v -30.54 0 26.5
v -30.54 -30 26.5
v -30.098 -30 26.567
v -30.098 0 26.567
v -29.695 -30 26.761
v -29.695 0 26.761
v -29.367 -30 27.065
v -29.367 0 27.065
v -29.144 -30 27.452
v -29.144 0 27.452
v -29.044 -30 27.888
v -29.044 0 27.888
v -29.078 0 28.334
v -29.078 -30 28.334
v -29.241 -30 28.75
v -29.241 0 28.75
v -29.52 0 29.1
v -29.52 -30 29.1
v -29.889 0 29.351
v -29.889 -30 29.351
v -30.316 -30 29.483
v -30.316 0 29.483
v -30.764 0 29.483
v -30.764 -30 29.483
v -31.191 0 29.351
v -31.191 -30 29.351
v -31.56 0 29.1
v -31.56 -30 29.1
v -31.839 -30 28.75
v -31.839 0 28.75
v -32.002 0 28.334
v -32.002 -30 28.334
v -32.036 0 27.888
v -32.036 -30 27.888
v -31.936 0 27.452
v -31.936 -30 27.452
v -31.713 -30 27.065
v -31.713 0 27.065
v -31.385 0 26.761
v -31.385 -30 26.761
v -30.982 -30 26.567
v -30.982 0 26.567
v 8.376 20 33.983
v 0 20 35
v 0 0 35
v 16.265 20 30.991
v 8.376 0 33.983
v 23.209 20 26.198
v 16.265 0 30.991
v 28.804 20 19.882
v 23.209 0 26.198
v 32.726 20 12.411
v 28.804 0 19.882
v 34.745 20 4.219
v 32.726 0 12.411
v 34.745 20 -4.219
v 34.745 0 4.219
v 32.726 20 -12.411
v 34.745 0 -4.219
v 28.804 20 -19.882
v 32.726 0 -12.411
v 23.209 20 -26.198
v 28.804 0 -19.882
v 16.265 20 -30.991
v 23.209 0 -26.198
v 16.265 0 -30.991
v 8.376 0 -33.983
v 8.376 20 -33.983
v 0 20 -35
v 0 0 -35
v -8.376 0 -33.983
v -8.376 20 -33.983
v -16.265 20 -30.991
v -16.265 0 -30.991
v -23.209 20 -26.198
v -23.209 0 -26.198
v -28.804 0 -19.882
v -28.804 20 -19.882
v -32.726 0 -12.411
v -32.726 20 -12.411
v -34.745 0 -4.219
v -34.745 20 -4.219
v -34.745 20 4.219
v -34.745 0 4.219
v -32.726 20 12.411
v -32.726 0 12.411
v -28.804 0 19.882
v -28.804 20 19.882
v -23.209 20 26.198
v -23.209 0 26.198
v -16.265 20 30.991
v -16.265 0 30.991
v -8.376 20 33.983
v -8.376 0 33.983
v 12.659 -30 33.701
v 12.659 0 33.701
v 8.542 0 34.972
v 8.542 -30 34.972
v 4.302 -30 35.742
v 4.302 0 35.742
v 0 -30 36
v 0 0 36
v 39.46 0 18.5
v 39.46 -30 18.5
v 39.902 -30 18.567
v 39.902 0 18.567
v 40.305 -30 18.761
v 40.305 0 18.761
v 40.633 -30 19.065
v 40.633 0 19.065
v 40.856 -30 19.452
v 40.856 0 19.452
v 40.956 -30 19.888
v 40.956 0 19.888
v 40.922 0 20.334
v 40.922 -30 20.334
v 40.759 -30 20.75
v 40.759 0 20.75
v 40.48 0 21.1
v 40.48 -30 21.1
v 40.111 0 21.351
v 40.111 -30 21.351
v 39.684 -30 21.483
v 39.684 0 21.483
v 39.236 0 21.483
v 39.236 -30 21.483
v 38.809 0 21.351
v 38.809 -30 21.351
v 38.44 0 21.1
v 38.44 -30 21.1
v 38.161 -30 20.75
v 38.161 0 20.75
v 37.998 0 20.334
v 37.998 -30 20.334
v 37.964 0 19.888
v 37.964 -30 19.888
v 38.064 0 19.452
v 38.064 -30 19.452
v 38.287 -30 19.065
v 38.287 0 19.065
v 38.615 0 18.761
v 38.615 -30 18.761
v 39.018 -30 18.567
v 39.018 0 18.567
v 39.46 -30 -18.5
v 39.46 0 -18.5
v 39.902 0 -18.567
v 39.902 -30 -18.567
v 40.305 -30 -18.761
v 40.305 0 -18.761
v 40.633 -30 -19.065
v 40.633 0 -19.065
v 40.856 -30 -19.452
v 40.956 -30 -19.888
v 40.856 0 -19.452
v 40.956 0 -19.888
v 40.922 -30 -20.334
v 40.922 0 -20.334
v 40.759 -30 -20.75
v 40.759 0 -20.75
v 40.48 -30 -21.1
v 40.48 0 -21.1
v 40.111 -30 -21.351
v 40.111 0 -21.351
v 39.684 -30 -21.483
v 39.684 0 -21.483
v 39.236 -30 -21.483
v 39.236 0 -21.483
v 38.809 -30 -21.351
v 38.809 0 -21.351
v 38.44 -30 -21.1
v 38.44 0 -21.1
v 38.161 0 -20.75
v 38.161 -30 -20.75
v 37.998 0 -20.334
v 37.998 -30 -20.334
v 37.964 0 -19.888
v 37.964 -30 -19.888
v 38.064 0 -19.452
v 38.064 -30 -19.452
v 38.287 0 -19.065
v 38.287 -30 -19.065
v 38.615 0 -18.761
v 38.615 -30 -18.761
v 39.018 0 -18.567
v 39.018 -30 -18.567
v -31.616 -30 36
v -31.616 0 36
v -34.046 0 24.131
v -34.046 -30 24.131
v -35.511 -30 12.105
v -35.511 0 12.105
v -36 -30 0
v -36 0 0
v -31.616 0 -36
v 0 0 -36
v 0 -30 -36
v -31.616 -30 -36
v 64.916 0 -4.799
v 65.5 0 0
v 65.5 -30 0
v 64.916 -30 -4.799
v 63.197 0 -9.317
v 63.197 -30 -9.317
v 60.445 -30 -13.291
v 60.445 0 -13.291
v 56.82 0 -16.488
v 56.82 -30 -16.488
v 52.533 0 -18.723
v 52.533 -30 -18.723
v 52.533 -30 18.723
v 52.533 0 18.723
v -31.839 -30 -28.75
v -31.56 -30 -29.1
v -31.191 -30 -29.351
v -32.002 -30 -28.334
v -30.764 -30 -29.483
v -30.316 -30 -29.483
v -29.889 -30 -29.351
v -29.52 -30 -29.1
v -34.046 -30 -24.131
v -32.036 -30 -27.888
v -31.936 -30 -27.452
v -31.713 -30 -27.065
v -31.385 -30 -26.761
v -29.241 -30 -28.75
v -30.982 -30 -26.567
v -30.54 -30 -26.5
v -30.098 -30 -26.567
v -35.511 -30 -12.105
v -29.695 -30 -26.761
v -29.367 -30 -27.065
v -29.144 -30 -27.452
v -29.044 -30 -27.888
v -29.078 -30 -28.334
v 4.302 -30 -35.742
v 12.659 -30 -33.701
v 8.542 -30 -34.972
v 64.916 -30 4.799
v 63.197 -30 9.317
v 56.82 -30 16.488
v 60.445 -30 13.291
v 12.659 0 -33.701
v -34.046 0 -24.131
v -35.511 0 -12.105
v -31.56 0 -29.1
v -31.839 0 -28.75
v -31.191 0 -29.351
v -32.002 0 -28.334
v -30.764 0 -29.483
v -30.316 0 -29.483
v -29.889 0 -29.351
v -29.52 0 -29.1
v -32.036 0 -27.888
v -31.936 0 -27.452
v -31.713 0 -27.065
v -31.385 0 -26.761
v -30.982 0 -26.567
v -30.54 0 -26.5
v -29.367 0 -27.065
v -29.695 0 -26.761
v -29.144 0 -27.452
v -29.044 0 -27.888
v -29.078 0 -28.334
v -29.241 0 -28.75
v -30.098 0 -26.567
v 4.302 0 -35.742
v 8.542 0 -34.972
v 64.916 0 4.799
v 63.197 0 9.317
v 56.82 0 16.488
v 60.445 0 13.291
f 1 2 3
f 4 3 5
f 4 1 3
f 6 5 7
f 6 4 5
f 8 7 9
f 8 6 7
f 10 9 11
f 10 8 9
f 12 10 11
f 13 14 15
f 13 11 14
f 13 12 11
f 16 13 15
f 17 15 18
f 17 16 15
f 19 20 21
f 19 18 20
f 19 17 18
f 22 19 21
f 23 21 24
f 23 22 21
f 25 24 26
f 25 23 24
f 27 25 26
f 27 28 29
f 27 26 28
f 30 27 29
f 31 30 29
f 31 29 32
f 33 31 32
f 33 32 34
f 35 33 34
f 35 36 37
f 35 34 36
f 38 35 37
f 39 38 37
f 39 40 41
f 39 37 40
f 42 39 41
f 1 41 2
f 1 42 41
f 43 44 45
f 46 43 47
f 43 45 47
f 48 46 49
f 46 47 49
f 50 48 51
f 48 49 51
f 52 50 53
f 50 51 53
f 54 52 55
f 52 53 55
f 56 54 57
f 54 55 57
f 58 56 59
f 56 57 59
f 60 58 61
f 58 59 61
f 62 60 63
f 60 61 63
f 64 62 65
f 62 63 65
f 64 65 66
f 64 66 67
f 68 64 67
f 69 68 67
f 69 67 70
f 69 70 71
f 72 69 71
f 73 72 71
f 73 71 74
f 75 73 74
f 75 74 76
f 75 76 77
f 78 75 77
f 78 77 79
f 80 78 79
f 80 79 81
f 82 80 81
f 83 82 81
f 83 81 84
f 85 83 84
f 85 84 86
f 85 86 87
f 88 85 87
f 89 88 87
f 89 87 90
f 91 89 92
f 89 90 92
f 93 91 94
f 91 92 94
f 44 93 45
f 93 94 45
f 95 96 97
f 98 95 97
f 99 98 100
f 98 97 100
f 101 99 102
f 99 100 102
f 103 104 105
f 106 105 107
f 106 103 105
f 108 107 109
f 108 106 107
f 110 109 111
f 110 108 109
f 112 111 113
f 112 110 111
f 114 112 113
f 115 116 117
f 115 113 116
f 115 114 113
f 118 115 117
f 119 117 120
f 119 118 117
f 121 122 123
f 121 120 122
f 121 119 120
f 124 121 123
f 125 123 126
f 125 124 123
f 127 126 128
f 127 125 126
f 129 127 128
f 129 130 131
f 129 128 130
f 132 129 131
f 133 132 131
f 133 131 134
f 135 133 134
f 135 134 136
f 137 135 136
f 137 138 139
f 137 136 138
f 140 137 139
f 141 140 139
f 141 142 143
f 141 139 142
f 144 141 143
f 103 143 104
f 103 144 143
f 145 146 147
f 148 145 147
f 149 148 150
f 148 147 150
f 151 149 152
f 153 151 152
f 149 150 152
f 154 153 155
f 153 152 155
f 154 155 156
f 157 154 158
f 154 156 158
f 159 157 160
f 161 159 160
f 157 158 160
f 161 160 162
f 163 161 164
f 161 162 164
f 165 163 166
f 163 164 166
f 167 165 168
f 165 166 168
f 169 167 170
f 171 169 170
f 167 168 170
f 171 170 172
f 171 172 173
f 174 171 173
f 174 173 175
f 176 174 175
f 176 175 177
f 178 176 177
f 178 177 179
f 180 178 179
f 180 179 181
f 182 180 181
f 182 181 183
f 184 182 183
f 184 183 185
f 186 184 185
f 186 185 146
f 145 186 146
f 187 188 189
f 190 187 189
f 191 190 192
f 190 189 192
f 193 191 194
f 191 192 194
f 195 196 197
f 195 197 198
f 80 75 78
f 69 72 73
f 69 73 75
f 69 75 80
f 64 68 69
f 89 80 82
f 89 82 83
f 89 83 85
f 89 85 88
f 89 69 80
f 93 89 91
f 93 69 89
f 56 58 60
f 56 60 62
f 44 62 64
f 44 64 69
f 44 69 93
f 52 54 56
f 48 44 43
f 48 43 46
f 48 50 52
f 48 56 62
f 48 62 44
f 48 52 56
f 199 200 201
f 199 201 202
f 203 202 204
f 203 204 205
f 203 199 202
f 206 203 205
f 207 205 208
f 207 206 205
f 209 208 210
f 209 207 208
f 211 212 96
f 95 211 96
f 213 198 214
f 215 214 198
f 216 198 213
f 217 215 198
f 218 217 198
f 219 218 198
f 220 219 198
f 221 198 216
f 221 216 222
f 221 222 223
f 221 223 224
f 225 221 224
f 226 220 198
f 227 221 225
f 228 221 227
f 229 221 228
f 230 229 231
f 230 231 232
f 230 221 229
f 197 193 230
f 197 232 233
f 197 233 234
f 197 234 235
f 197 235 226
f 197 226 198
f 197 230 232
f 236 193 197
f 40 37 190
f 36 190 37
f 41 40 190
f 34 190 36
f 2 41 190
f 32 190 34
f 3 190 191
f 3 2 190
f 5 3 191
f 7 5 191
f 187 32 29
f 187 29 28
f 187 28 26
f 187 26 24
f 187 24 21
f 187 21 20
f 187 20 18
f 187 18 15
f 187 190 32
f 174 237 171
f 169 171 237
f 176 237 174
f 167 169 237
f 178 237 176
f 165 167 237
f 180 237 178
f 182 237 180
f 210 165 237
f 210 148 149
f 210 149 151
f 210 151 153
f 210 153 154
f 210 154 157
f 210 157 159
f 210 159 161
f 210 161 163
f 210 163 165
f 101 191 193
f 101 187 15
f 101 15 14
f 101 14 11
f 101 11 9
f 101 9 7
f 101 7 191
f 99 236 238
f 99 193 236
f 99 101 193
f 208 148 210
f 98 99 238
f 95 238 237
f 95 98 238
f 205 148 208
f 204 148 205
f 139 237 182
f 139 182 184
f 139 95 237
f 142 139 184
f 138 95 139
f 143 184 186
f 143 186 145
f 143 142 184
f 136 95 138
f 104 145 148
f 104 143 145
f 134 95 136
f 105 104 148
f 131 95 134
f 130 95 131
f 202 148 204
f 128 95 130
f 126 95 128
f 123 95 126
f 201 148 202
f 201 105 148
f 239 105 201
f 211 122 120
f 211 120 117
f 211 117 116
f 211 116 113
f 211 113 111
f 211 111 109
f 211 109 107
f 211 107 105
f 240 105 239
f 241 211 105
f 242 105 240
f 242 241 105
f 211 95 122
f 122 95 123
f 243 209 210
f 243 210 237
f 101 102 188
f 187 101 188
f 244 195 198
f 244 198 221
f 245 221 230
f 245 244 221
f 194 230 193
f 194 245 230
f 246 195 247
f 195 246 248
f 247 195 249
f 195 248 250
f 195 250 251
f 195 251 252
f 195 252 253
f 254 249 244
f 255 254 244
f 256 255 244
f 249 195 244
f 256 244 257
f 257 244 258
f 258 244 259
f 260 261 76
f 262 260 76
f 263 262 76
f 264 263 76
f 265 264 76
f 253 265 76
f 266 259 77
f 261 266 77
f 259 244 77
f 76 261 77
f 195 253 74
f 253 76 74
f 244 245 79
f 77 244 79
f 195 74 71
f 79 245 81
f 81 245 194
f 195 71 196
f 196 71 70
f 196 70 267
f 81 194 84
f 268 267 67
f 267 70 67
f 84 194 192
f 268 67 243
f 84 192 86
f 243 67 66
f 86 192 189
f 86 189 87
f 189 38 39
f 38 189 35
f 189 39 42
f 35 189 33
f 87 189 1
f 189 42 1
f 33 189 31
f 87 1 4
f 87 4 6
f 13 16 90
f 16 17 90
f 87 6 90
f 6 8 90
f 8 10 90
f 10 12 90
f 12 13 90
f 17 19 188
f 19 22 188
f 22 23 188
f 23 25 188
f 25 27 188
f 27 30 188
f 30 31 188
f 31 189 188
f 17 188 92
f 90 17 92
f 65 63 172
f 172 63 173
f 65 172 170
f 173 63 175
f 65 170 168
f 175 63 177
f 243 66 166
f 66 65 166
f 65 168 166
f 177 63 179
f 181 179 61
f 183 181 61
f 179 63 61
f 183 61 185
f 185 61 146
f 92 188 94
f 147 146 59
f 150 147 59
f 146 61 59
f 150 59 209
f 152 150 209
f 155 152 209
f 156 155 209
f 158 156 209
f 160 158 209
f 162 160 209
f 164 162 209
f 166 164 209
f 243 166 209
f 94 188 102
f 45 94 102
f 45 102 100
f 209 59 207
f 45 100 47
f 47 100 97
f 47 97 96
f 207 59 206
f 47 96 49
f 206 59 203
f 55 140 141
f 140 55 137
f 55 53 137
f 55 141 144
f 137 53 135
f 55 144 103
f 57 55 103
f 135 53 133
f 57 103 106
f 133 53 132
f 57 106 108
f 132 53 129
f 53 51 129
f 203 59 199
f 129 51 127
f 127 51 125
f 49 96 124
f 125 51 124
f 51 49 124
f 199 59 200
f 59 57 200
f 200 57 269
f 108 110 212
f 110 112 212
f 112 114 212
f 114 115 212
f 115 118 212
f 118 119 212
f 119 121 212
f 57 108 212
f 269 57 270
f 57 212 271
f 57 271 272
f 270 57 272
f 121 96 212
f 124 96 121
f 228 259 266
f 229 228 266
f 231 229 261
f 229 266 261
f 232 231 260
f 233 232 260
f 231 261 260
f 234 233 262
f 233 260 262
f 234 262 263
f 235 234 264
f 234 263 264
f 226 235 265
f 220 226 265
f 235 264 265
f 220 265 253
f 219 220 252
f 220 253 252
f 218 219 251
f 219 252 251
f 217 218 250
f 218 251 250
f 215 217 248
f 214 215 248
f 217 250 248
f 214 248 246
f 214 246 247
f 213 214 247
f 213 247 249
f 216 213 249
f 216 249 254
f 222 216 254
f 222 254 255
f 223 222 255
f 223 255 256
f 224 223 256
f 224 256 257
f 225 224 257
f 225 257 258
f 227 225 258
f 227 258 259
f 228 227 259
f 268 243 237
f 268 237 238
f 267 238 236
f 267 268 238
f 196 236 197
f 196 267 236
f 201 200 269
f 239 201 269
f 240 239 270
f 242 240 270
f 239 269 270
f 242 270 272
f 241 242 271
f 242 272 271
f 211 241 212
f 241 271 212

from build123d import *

# Parameters (mm, degrees)
SKETCH_1_R          = 35
EXTRUDE_1_DEPTH     = 20
EXTRUDE_2_DEPTH     = 30
SKETCH_4_R          = 1.5
CUT_EXTRUDE_1_DEPTH = 81.537258458


with BuildPart() as part:
    # 草图1 → 凸台-拉伸1 (new body)
    with BuildSketch(Plane(origin=(0, 0, 0), x_dir=(1, 0, 0), z_dir=(0, 1, 0))):
        with Locations(Location((0, 0, 0), (0, 0, 270))):
            Circle(SKETCH_1_R)
    extrude(amount=EXTRUDE_1_DEPTH)

    # 草图2 → 凸台-拉伸2 (add)
    with BuildSketch(Plane(origin=(0, 0, 0), x_dir=(1, 0, 0), z_dir=(0, 1, 0))):
        with BuildLine():
            Line((52.532967033, 18.722643369), (12.659340659, 33.700758064))
            ThreePointArc((12.659340659, 33.700758064), (6.433222742, 35.42052576), (0, 36))
            Line((0, 36), (-31.615933194, 36))
            ThreePointArc((-31.615933194, 36), (-34.899949596, 18.132981289), (-36, 0))
            Line((-36, 0), (65.5, 0))
            ThreePointArc((65.5, 0), (61.941705214, 11.387288074), (52.532967033, 18.722643369))
        make_face()
    extrude_2 = extrude(amount=-EXTRUDE_2_DEPTH)

    # 镜向1: 凸台-拉伸2 across plane
    add(extrude_2.mirror(Plane(origin=(-36, -30, 0), x_dir=(1, 0, 0), z_dir=(0, 0, 1))))

    # 草图4 → 切除-拉伸1 (cut, through all)
    with BuildSketch(Plane(origin=(0, 0, 0), x_dir=(1, 0, 0), z_dir=(0, 1, 0))):
        with Locations(Location((-30.54, 28, 0), (0, 0, 270))):
            Circle(SKETCH_4_R)
        with Locations(Location((39.46, 20, 0), (0, 0, 270))):
            Circle(SKETCH_4_R)
    cut_extrude_1 = extrude(amount=-CUT_EXTRUDE_1_DEPTH, mode=Mode.SUBTRACT)

    # 镜向2: 切除-拉伸1 across plane
    add(cut_extrude_1.mirror(Plane.XY), mode=Mode.SUBTRACT)


solid = part.part
